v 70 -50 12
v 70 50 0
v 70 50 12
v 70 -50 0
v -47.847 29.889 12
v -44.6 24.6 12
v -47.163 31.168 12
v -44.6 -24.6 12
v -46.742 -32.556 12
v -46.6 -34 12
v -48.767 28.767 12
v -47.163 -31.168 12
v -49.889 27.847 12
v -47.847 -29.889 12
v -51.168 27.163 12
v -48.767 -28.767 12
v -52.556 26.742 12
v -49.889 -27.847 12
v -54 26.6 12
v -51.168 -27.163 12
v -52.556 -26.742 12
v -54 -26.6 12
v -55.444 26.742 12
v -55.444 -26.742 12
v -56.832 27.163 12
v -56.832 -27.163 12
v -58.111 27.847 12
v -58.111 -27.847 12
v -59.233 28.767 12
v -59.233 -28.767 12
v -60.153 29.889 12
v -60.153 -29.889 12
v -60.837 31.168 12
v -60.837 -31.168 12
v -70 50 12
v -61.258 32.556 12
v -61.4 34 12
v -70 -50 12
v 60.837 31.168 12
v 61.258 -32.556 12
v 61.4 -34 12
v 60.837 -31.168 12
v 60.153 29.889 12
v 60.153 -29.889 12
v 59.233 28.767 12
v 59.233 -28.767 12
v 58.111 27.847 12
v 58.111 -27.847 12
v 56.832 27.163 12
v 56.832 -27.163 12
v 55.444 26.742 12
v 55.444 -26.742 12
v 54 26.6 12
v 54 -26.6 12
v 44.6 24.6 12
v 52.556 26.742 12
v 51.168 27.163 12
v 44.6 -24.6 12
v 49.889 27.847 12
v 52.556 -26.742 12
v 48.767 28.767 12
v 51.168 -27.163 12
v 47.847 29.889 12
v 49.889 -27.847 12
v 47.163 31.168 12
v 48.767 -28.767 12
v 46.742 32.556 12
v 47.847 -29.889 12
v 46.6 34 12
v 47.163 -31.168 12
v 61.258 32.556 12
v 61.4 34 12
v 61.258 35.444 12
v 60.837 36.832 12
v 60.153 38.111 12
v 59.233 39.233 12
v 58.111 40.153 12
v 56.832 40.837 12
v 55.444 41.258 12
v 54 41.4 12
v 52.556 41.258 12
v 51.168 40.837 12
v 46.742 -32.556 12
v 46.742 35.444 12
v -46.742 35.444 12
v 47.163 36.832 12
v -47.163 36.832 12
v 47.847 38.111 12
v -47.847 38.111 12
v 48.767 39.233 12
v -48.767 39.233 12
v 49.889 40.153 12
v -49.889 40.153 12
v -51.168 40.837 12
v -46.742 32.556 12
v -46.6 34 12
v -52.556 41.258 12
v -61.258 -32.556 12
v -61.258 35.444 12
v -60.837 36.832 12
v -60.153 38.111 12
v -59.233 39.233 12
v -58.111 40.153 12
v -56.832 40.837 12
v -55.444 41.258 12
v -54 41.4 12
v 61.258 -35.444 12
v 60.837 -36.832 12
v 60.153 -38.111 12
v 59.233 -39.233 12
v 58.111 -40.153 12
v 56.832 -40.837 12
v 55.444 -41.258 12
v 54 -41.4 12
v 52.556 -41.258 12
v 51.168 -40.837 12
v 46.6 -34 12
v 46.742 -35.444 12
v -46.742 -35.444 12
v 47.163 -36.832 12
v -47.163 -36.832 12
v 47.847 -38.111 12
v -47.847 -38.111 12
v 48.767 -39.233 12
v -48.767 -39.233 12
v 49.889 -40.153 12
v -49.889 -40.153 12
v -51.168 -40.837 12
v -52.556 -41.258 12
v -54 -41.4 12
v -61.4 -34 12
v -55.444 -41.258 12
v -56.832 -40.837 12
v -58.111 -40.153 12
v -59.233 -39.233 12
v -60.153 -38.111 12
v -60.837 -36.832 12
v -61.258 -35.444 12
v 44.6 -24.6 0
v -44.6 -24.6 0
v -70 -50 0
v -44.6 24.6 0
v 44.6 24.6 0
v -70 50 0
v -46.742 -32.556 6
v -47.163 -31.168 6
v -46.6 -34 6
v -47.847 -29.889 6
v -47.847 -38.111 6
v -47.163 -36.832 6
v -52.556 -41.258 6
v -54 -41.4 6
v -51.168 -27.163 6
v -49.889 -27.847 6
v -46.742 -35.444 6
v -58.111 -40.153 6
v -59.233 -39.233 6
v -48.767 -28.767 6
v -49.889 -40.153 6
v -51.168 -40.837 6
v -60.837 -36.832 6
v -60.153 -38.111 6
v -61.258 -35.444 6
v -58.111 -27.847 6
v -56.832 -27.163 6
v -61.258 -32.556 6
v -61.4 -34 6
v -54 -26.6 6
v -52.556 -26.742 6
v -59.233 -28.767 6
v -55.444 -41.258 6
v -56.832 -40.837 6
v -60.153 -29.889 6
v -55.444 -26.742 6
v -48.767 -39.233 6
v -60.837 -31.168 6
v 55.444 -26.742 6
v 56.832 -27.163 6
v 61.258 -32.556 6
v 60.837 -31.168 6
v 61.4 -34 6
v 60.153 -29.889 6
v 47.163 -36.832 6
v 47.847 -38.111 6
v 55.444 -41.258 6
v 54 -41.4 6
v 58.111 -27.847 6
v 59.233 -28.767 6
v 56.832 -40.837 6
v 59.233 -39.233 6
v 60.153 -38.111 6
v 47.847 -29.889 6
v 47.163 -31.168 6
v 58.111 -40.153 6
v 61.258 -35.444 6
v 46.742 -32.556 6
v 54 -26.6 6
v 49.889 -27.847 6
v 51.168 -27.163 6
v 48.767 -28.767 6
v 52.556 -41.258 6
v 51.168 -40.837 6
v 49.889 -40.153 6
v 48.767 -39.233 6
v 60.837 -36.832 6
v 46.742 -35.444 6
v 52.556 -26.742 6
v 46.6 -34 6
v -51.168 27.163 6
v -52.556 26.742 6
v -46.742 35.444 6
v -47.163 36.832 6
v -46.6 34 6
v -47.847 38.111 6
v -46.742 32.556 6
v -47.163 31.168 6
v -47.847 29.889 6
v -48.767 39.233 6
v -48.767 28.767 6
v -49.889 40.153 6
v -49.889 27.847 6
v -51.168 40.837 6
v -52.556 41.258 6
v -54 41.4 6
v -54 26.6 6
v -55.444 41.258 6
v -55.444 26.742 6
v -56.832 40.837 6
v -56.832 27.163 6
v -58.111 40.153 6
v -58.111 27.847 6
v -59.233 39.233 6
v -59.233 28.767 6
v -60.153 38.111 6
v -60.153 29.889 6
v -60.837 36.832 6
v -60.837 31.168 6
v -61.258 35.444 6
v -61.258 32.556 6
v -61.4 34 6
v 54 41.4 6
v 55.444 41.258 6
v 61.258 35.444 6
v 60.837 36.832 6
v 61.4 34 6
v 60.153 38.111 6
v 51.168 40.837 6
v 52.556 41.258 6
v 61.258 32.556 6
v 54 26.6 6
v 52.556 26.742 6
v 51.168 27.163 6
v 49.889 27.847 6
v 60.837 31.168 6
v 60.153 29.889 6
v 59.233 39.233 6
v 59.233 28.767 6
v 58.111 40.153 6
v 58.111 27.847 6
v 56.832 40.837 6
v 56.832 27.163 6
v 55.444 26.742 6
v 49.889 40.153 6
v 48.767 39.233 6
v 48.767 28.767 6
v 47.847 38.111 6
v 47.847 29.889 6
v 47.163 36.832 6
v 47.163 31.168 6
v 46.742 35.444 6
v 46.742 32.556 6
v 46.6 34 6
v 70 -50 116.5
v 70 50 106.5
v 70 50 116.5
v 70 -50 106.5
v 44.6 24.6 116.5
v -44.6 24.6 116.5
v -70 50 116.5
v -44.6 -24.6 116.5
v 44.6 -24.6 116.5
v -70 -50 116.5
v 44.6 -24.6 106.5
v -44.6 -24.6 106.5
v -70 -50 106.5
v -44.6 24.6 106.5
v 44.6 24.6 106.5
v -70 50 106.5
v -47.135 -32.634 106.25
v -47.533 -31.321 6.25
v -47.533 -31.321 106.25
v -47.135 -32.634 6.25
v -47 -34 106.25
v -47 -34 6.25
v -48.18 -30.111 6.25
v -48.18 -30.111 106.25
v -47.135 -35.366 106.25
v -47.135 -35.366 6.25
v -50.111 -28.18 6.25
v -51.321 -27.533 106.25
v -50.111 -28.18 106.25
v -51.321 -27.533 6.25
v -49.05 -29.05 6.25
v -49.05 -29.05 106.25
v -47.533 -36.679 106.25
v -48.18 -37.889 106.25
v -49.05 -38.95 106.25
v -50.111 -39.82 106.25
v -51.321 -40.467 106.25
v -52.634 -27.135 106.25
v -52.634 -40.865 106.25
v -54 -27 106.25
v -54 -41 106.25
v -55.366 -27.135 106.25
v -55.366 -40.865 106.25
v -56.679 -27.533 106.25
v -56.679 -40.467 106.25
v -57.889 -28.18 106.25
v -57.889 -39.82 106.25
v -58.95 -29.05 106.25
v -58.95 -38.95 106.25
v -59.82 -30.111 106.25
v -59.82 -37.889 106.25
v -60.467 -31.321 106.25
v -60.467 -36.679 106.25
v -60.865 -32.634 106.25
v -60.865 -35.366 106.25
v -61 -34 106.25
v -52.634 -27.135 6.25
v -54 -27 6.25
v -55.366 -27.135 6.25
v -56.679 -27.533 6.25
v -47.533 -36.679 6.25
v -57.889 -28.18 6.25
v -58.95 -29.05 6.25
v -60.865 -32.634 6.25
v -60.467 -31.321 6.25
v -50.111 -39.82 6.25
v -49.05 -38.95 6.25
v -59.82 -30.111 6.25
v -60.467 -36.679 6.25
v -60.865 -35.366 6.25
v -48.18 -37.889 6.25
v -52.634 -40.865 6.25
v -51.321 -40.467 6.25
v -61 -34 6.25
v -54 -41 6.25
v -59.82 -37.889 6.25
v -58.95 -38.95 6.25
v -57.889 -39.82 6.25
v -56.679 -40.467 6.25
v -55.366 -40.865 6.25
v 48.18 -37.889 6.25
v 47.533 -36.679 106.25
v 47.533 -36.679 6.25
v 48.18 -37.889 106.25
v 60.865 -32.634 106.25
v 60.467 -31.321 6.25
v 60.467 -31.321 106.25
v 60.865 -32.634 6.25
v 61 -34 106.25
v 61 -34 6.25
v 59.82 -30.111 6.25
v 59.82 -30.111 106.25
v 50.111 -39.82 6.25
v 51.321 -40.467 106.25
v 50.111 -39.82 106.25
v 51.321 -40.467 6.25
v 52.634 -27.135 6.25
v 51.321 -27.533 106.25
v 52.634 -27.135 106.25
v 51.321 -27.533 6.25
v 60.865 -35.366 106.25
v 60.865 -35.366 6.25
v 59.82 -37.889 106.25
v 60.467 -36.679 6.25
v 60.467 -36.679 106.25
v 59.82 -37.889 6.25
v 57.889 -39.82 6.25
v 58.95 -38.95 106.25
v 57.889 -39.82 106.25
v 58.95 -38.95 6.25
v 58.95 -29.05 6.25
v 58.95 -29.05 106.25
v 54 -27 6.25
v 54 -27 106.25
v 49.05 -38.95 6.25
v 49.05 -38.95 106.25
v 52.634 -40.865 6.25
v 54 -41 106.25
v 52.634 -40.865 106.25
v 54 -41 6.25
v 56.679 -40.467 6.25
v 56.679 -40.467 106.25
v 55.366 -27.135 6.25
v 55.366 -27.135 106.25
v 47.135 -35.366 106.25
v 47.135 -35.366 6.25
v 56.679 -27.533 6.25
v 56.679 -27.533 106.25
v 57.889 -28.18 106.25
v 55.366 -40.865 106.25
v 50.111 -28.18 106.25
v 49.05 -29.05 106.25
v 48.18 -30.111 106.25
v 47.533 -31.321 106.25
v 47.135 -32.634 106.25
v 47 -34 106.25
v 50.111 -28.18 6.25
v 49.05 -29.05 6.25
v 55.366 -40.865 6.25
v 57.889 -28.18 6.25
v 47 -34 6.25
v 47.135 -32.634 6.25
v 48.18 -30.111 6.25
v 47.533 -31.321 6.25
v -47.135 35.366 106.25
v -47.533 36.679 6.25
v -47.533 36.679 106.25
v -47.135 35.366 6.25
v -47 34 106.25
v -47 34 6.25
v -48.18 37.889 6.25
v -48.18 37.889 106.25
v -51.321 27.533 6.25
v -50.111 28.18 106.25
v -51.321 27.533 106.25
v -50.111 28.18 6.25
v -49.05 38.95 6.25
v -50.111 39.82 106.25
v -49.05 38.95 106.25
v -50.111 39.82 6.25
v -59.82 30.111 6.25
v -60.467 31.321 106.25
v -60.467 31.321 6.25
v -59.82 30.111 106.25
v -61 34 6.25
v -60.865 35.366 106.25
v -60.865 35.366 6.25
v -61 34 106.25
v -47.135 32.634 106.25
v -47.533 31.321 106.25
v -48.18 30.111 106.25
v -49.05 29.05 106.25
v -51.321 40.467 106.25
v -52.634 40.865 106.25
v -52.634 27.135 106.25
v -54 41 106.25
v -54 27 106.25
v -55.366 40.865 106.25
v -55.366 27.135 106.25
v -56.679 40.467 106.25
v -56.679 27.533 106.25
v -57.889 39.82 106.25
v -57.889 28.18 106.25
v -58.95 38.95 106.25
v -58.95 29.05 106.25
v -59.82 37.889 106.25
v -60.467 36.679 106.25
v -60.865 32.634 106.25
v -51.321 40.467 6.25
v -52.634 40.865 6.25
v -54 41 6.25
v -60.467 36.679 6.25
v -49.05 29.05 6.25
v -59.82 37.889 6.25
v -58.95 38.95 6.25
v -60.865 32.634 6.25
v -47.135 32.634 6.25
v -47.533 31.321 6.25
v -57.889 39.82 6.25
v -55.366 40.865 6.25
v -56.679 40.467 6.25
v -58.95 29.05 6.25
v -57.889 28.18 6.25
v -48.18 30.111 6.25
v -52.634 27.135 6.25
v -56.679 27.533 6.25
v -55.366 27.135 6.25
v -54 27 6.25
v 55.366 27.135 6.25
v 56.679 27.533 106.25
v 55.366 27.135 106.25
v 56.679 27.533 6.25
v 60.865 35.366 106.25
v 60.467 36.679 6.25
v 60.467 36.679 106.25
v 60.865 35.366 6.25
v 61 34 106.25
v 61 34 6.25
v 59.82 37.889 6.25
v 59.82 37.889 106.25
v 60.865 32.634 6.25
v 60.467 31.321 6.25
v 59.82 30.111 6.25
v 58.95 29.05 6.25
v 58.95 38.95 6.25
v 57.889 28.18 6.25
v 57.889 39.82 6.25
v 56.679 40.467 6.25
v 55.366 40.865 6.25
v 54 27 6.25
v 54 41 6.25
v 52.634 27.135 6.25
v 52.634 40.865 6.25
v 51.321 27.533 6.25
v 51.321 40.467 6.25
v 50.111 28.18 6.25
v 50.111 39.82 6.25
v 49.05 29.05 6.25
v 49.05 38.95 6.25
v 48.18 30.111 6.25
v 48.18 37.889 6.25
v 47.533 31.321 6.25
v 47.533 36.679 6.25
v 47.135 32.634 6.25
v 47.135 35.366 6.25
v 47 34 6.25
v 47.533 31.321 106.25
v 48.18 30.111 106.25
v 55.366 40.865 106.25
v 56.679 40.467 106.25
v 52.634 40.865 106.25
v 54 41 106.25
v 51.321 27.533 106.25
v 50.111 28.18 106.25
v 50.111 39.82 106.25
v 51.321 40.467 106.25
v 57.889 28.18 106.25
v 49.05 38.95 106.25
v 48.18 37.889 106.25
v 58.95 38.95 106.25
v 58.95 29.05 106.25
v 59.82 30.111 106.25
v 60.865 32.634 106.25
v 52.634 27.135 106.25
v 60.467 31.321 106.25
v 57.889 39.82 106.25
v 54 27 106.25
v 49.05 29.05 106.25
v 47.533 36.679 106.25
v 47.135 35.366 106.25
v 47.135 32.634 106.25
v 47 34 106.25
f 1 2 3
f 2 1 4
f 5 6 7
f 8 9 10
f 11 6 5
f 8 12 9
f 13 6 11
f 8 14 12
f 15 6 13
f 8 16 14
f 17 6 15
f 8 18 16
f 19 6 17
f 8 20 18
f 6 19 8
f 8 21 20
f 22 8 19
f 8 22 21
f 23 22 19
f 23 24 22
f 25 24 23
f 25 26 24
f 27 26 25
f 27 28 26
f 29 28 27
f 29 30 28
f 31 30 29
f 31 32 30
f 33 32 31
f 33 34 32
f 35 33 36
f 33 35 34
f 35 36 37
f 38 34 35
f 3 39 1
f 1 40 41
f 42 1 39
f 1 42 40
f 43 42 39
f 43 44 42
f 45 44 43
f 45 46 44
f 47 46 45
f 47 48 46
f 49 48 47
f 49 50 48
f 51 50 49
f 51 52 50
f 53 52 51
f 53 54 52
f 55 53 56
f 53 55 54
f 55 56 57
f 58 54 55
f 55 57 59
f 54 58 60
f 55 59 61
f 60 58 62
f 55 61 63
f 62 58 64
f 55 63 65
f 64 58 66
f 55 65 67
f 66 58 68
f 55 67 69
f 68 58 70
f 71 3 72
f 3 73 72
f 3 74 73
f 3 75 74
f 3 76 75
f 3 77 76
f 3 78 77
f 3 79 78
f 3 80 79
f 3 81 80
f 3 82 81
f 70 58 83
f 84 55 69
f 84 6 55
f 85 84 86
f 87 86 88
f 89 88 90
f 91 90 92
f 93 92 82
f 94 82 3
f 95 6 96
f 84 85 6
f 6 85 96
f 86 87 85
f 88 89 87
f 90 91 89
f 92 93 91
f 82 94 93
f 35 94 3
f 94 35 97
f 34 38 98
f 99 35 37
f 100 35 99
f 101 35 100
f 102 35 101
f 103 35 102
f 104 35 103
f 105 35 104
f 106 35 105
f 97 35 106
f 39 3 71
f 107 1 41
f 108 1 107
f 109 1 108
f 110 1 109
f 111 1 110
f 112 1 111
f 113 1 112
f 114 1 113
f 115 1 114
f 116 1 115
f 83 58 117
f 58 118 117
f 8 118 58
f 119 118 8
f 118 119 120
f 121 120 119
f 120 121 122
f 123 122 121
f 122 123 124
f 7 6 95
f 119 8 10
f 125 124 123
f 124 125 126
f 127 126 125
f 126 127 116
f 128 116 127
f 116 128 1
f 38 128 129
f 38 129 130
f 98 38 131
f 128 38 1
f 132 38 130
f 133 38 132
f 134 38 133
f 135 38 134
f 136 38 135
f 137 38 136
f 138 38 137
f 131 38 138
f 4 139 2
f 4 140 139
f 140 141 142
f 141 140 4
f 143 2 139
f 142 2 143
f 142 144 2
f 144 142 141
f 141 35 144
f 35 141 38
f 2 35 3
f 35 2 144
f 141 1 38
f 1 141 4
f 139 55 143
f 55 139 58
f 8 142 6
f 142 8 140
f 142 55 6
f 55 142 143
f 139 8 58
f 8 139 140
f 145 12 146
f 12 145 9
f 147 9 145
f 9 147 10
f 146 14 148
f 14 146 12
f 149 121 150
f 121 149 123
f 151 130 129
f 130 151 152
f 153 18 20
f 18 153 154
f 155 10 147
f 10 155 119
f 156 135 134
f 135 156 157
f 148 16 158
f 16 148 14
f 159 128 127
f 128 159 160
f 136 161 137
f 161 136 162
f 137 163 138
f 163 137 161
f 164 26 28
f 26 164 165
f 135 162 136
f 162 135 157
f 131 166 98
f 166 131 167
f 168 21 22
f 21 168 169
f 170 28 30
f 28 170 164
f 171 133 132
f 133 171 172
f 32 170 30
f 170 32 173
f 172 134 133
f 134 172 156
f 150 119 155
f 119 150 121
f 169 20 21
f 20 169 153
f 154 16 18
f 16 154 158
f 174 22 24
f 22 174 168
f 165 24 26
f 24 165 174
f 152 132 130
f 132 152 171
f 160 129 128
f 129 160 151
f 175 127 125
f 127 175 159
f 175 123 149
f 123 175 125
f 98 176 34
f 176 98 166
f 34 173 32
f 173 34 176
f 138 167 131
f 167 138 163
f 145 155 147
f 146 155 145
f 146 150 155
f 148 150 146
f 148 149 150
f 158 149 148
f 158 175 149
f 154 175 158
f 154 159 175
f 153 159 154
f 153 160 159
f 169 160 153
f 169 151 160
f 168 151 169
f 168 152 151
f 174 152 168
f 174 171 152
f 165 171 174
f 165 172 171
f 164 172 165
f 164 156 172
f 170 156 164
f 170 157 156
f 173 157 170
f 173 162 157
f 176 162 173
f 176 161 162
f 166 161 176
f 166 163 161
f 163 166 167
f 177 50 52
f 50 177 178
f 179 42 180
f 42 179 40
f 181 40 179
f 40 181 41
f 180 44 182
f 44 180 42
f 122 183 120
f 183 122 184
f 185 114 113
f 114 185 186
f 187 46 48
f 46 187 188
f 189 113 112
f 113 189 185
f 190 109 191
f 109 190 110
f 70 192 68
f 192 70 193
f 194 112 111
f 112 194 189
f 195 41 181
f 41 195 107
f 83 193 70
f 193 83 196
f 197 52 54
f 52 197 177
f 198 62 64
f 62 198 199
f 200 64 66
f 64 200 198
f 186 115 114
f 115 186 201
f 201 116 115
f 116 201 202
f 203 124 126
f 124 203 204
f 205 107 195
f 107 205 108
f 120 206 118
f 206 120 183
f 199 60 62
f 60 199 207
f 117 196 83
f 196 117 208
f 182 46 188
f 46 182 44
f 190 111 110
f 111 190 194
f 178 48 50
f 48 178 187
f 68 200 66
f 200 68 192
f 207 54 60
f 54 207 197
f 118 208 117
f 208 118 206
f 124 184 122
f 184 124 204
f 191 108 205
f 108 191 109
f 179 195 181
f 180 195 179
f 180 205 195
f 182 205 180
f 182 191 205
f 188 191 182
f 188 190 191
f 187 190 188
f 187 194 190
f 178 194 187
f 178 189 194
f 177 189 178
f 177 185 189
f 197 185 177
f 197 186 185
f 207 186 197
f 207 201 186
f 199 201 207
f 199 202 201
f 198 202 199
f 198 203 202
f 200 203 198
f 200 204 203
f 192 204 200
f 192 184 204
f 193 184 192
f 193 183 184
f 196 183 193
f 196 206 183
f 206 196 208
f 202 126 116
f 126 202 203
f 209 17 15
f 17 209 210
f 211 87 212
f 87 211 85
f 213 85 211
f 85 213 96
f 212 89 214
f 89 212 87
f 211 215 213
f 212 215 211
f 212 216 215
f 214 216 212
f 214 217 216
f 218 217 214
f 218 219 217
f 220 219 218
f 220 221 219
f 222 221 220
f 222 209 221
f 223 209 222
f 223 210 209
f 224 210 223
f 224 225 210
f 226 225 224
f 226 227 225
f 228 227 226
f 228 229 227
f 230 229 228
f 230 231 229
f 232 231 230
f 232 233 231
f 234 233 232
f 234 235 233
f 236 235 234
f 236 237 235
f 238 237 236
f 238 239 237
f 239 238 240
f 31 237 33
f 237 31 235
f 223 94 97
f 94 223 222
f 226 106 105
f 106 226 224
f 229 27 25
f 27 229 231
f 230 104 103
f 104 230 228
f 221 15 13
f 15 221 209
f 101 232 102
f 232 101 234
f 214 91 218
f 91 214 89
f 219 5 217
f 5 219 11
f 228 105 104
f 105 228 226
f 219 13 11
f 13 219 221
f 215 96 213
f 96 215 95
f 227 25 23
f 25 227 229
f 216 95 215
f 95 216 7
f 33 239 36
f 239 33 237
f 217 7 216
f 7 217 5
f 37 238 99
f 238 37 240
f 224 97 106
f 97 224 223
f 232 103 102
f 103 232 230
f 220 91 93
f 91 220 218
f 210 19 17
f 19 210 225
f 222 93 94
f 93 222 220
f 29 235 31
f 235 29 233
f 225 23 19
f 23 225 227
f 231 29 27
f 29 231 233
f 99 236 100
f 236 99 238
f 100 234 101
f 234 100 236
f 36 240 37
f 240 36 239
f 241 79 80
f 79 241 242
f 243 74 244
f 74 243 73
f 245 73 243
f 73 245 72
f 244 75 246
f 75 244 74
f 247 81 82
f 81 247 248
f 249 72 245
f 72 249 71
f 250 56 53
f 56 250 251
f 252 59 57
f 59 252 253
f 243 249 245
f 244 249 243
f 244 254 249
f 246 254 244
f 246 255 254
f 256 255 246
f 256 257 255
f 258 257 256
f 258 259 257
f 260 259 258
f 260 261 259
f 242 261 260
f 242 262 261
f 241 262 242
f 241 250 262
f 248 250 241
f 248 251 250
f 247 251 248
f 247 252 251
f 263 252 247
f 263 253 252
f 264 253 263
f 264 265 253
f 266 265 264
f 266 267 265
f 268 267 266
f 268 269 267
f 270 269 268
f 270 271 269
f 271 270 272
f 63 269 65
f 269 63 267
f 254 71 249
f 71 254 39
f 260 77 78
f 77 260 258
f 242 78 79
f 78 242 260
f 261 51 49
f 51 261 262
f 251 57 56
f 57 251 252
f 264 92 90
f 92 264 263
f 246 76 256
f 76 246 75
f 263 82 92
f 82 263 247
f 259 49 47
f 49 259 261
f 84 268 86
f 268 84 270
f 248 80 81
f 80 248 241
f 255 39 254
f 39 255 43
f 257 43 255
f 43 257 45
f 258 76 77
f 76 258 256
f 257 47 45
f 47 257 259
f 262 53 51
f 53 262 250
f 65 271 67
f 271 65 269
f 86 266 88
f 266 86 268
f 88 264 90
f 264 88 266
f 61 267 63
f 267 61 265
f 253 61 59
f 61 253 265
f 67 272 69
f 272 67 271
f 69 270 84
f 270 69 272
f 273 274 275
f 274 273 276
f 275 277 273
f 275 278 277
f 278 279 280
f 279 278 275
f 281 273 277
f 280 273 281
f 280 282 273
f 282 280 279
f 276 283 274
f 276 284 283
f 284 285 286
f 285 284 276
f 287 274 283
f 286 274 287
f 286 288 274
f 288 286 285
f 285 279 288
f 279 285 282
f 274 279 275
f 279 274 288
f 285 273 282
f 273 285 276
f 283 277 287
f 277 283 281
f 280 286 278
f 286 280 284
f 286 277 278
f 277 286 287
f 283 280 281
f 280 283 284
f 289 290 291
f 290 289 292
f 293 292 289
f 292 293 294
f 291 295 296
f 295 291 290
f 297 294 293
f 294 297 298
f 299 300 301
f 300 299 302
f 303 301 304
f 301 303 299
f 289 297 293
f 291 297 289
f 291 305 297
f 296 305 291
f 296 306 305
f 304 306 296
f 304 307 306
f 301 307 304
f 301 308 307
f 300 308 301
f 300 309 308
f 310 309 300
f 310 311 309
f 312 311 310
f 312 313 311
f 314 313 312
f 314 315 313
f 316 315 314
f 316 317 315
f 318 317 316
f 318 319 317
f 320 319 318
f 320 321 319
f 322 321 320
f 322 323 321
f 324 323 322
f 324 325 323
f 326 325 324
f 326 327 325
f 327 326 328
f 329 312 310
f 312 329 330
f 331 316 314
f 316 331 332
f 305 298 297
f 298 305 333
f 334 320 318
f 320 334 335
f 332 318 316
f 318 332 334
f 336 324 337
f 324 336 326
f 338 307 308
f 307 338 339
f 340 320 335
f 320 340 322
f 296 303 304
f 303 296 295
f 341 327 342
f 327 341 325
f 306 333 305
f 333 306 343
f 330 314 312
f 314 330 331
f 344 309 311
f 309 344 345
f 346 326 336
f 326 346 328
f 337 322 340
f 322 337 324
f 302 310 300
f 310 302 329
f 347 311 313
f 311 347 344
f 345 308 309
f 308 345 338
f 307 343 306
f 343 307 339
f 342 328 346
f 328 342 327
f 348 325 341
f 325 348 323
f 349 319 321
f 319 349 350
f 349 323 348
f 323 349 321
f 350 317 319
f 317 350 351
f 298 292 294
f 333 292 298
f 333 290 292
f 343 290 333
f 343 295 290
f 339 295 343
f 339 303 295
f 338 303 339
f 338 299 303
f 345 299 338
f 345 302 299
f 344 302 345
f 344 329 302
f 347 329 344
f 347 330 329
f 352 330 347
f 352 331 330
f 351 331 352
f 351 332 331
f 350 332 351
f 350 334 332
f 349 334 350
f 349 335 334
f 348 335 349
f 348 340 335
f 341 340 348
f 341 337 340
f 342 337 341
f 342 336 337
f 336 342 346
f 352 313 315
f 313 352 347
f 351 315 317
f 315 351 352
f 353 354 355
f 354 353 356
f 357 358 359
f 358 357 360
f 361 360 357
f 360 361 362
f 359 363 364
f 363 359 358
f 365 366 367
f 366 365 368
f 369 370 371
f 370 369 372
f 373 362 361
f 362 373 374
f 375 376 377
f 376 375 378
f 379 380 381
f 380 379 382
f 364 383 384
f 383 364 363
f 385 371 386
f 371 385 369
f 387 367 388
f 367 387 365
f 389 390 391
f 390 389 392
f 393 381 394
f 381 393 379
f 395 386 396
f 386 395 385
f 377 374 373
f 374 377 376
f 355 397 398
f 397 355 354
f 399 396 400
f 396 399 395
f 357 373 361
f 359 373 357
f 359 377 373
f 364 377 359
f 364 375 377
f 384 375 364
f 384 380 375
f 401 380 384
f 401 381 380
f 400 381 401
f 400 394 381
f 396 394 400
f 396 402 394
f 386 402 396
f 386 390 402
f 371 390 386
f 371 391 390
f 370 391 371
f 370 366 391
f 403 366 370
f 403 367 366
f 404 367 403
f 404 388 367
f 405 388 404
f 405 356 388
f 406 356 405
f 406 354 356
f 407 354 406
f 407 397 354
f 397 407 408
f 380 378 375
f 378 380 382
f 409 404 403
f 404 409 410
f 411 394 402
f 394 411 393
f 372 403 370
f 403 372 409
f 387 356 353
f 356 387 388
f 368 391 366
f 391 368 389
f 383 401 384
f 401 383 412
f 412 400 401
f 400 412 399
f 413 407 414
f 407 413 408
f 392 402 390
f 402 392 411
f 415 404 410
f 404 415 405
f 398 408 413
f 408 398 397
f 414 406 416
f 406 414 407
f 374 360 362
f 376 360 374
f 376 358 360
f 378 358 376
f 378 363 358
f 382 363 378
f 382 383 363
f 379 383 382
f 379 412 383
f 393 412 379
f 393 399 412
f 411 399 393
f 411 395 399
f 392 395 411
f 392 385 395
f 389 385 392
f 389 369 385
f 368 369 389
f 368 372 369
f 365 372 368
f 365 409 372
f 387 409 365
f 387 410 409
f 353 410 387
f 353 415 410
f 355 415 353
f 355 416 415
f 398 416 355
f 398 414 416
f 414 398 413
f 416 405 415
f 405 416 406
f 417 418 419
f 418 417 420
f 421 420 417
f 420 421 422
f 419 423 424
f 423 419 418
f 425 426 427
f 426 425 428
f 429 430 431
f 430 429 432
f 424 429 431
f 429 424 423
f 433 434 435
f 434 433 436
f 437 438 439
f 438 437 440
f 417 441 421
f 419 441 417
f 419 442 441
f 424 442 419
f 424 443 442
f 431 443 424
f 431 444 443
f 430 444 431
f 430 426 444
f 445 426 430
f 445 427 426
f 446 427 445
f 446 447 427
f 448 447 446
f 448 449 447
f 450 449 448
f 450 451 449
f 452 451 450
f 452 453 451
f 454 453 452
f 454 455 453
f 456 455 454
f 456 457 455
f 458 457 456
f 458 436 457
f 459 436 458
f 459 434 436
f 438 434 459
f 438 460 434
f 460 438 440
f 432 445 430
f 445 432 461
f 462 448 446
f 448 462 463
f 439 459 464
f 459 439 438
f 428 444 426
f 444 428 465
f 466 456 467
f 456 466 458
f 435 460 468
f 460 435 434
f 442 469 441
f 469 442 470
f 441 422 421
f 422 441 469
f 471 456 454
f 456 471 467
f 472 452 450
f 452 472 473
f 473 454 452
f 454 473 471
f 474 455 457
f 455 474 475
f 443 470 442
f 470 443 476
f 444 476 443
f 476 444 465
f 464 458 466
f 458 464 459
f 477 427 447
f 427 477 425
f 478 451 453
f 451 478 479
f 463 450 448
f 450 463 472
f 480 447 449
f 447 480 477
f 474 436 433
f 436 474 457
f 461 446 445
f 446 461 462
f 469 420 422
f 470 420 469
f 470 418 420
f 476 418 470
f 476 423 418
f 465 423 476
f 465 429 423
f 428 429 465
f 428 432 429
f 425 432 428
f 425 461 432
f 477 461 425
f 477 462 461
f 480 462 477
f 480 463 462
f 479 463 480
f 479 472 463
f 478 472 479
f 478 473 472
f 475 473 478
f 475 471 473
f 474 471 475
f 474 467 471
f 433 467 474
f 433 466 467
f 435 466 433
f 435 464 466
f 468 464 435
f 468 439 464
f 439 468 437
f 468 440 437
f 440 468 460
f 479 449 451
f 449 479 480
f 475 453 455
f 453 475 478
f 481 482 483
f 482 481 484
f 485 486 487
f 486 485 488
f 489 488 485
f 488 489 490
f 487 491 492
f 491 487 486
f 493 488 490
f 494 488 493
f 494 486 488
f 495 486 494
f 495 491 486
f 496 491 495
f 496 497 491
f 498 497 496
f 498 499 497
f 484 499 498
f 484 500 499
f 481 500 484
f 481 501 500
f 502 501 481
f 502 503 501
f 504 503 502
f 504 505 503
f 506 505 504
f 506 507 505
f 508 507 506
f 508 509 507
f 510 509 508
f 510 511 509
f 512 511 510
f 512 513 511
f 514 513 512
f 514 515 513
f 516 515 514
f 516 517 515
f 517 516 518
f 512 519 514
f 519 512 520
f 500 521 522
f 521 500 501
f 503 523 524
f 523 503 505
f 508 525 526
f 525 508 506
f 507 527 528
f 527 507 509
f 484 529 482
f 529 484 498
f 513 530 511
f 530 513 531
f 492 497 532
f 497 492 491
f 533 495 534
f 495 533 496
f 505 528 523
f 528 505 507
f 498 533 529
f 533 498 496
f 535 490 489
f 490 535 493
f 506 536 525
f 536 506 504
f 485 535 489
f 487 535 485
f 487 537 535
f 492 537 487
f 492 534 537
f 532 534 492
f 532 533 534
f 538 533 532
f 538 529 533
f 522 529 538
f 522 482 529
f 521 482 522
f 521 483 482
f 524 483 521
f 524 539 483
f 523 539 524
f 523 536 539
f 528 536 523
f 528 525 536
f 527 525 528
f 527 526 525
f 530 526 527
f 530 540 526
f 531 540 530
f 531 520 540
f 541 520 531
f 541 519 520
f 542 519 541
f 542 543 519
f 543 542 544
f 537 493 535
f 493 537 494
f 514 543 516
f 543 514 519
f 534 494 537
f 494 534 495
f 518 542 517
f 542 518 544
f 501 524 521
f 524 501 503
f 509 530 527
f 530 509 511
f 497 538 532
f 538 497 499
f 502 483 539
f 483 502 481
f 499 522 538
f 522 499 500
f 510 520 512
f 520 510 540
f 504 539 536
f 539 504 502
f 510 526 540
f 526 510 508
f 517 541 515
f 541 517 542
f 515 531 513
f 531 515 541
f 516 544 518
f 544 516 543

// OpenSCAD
$fn = 32;

// ------------------------------------------------------------------------
// Frame cube: base 140 x 100 mm, posts 100 mm tall
// Every part is its own module, assembly() places every instance.
// ------------------------------------------------------------------------

// --- part 1 ---
module base_frame() {
  difference() {
    translate([-70, -50, 0]) cube([140, 100, 12]);
    translate([-44.6, -24.6, -1]) cube([89.2, 49.2, 14]);
    translate([-54, -34, 6]) cylinder(h = 7, d = 14.8);
    translate([54, -34, 6]) cylinder(h = 7, d = 14.8);
    translate([-54, 34, 6]) cylinder(h = 7, d = 14.8);
    translate([54, 34, 6]) cylinder(h = 7, d = 14.8);
  }
}

// --- part 2 ---
module corner_post() {
  cylinder(h = 100, d = 14);
}

// --- part 3 ---
module top_frame() {
  difference() {
    translate([-70, -50, 0]) cube([140, 100, 10]);
    translate([-44.6, -24.6, -1]) cube([89.2, 49.2, 12]);
  }
}

// --- assembly ---
module assembly() {
  color([0.80, 0.24, 0.20]) translate([0, 0, 0]) rotate([0, 0, 0]) base_frame();
  color([0.20, 0.45, 0.75]) translate([-54, -34, 6.25]) rotate([0, 0, 0]) corner_post();
  color([0.25, 0.62, 0.32]) translate([54, -34, 6.25]) rotate([0, 0, 0]) corner_post();
  color([0.92, 0.70, 0.18]) translate([-54, 34, 6.25]) rotate([0, 0, 0]) corner_post();
  color([0.58, 0.35, 0.70]) translate([54, 34, 6.25]) rotate([0, 0, 0]) corner_post();
  color([0.16, 0.66, 0.66]) translate([0, 0, 106.5]) rotate([0, 0, 0]) top_frame();
}

assembly();
